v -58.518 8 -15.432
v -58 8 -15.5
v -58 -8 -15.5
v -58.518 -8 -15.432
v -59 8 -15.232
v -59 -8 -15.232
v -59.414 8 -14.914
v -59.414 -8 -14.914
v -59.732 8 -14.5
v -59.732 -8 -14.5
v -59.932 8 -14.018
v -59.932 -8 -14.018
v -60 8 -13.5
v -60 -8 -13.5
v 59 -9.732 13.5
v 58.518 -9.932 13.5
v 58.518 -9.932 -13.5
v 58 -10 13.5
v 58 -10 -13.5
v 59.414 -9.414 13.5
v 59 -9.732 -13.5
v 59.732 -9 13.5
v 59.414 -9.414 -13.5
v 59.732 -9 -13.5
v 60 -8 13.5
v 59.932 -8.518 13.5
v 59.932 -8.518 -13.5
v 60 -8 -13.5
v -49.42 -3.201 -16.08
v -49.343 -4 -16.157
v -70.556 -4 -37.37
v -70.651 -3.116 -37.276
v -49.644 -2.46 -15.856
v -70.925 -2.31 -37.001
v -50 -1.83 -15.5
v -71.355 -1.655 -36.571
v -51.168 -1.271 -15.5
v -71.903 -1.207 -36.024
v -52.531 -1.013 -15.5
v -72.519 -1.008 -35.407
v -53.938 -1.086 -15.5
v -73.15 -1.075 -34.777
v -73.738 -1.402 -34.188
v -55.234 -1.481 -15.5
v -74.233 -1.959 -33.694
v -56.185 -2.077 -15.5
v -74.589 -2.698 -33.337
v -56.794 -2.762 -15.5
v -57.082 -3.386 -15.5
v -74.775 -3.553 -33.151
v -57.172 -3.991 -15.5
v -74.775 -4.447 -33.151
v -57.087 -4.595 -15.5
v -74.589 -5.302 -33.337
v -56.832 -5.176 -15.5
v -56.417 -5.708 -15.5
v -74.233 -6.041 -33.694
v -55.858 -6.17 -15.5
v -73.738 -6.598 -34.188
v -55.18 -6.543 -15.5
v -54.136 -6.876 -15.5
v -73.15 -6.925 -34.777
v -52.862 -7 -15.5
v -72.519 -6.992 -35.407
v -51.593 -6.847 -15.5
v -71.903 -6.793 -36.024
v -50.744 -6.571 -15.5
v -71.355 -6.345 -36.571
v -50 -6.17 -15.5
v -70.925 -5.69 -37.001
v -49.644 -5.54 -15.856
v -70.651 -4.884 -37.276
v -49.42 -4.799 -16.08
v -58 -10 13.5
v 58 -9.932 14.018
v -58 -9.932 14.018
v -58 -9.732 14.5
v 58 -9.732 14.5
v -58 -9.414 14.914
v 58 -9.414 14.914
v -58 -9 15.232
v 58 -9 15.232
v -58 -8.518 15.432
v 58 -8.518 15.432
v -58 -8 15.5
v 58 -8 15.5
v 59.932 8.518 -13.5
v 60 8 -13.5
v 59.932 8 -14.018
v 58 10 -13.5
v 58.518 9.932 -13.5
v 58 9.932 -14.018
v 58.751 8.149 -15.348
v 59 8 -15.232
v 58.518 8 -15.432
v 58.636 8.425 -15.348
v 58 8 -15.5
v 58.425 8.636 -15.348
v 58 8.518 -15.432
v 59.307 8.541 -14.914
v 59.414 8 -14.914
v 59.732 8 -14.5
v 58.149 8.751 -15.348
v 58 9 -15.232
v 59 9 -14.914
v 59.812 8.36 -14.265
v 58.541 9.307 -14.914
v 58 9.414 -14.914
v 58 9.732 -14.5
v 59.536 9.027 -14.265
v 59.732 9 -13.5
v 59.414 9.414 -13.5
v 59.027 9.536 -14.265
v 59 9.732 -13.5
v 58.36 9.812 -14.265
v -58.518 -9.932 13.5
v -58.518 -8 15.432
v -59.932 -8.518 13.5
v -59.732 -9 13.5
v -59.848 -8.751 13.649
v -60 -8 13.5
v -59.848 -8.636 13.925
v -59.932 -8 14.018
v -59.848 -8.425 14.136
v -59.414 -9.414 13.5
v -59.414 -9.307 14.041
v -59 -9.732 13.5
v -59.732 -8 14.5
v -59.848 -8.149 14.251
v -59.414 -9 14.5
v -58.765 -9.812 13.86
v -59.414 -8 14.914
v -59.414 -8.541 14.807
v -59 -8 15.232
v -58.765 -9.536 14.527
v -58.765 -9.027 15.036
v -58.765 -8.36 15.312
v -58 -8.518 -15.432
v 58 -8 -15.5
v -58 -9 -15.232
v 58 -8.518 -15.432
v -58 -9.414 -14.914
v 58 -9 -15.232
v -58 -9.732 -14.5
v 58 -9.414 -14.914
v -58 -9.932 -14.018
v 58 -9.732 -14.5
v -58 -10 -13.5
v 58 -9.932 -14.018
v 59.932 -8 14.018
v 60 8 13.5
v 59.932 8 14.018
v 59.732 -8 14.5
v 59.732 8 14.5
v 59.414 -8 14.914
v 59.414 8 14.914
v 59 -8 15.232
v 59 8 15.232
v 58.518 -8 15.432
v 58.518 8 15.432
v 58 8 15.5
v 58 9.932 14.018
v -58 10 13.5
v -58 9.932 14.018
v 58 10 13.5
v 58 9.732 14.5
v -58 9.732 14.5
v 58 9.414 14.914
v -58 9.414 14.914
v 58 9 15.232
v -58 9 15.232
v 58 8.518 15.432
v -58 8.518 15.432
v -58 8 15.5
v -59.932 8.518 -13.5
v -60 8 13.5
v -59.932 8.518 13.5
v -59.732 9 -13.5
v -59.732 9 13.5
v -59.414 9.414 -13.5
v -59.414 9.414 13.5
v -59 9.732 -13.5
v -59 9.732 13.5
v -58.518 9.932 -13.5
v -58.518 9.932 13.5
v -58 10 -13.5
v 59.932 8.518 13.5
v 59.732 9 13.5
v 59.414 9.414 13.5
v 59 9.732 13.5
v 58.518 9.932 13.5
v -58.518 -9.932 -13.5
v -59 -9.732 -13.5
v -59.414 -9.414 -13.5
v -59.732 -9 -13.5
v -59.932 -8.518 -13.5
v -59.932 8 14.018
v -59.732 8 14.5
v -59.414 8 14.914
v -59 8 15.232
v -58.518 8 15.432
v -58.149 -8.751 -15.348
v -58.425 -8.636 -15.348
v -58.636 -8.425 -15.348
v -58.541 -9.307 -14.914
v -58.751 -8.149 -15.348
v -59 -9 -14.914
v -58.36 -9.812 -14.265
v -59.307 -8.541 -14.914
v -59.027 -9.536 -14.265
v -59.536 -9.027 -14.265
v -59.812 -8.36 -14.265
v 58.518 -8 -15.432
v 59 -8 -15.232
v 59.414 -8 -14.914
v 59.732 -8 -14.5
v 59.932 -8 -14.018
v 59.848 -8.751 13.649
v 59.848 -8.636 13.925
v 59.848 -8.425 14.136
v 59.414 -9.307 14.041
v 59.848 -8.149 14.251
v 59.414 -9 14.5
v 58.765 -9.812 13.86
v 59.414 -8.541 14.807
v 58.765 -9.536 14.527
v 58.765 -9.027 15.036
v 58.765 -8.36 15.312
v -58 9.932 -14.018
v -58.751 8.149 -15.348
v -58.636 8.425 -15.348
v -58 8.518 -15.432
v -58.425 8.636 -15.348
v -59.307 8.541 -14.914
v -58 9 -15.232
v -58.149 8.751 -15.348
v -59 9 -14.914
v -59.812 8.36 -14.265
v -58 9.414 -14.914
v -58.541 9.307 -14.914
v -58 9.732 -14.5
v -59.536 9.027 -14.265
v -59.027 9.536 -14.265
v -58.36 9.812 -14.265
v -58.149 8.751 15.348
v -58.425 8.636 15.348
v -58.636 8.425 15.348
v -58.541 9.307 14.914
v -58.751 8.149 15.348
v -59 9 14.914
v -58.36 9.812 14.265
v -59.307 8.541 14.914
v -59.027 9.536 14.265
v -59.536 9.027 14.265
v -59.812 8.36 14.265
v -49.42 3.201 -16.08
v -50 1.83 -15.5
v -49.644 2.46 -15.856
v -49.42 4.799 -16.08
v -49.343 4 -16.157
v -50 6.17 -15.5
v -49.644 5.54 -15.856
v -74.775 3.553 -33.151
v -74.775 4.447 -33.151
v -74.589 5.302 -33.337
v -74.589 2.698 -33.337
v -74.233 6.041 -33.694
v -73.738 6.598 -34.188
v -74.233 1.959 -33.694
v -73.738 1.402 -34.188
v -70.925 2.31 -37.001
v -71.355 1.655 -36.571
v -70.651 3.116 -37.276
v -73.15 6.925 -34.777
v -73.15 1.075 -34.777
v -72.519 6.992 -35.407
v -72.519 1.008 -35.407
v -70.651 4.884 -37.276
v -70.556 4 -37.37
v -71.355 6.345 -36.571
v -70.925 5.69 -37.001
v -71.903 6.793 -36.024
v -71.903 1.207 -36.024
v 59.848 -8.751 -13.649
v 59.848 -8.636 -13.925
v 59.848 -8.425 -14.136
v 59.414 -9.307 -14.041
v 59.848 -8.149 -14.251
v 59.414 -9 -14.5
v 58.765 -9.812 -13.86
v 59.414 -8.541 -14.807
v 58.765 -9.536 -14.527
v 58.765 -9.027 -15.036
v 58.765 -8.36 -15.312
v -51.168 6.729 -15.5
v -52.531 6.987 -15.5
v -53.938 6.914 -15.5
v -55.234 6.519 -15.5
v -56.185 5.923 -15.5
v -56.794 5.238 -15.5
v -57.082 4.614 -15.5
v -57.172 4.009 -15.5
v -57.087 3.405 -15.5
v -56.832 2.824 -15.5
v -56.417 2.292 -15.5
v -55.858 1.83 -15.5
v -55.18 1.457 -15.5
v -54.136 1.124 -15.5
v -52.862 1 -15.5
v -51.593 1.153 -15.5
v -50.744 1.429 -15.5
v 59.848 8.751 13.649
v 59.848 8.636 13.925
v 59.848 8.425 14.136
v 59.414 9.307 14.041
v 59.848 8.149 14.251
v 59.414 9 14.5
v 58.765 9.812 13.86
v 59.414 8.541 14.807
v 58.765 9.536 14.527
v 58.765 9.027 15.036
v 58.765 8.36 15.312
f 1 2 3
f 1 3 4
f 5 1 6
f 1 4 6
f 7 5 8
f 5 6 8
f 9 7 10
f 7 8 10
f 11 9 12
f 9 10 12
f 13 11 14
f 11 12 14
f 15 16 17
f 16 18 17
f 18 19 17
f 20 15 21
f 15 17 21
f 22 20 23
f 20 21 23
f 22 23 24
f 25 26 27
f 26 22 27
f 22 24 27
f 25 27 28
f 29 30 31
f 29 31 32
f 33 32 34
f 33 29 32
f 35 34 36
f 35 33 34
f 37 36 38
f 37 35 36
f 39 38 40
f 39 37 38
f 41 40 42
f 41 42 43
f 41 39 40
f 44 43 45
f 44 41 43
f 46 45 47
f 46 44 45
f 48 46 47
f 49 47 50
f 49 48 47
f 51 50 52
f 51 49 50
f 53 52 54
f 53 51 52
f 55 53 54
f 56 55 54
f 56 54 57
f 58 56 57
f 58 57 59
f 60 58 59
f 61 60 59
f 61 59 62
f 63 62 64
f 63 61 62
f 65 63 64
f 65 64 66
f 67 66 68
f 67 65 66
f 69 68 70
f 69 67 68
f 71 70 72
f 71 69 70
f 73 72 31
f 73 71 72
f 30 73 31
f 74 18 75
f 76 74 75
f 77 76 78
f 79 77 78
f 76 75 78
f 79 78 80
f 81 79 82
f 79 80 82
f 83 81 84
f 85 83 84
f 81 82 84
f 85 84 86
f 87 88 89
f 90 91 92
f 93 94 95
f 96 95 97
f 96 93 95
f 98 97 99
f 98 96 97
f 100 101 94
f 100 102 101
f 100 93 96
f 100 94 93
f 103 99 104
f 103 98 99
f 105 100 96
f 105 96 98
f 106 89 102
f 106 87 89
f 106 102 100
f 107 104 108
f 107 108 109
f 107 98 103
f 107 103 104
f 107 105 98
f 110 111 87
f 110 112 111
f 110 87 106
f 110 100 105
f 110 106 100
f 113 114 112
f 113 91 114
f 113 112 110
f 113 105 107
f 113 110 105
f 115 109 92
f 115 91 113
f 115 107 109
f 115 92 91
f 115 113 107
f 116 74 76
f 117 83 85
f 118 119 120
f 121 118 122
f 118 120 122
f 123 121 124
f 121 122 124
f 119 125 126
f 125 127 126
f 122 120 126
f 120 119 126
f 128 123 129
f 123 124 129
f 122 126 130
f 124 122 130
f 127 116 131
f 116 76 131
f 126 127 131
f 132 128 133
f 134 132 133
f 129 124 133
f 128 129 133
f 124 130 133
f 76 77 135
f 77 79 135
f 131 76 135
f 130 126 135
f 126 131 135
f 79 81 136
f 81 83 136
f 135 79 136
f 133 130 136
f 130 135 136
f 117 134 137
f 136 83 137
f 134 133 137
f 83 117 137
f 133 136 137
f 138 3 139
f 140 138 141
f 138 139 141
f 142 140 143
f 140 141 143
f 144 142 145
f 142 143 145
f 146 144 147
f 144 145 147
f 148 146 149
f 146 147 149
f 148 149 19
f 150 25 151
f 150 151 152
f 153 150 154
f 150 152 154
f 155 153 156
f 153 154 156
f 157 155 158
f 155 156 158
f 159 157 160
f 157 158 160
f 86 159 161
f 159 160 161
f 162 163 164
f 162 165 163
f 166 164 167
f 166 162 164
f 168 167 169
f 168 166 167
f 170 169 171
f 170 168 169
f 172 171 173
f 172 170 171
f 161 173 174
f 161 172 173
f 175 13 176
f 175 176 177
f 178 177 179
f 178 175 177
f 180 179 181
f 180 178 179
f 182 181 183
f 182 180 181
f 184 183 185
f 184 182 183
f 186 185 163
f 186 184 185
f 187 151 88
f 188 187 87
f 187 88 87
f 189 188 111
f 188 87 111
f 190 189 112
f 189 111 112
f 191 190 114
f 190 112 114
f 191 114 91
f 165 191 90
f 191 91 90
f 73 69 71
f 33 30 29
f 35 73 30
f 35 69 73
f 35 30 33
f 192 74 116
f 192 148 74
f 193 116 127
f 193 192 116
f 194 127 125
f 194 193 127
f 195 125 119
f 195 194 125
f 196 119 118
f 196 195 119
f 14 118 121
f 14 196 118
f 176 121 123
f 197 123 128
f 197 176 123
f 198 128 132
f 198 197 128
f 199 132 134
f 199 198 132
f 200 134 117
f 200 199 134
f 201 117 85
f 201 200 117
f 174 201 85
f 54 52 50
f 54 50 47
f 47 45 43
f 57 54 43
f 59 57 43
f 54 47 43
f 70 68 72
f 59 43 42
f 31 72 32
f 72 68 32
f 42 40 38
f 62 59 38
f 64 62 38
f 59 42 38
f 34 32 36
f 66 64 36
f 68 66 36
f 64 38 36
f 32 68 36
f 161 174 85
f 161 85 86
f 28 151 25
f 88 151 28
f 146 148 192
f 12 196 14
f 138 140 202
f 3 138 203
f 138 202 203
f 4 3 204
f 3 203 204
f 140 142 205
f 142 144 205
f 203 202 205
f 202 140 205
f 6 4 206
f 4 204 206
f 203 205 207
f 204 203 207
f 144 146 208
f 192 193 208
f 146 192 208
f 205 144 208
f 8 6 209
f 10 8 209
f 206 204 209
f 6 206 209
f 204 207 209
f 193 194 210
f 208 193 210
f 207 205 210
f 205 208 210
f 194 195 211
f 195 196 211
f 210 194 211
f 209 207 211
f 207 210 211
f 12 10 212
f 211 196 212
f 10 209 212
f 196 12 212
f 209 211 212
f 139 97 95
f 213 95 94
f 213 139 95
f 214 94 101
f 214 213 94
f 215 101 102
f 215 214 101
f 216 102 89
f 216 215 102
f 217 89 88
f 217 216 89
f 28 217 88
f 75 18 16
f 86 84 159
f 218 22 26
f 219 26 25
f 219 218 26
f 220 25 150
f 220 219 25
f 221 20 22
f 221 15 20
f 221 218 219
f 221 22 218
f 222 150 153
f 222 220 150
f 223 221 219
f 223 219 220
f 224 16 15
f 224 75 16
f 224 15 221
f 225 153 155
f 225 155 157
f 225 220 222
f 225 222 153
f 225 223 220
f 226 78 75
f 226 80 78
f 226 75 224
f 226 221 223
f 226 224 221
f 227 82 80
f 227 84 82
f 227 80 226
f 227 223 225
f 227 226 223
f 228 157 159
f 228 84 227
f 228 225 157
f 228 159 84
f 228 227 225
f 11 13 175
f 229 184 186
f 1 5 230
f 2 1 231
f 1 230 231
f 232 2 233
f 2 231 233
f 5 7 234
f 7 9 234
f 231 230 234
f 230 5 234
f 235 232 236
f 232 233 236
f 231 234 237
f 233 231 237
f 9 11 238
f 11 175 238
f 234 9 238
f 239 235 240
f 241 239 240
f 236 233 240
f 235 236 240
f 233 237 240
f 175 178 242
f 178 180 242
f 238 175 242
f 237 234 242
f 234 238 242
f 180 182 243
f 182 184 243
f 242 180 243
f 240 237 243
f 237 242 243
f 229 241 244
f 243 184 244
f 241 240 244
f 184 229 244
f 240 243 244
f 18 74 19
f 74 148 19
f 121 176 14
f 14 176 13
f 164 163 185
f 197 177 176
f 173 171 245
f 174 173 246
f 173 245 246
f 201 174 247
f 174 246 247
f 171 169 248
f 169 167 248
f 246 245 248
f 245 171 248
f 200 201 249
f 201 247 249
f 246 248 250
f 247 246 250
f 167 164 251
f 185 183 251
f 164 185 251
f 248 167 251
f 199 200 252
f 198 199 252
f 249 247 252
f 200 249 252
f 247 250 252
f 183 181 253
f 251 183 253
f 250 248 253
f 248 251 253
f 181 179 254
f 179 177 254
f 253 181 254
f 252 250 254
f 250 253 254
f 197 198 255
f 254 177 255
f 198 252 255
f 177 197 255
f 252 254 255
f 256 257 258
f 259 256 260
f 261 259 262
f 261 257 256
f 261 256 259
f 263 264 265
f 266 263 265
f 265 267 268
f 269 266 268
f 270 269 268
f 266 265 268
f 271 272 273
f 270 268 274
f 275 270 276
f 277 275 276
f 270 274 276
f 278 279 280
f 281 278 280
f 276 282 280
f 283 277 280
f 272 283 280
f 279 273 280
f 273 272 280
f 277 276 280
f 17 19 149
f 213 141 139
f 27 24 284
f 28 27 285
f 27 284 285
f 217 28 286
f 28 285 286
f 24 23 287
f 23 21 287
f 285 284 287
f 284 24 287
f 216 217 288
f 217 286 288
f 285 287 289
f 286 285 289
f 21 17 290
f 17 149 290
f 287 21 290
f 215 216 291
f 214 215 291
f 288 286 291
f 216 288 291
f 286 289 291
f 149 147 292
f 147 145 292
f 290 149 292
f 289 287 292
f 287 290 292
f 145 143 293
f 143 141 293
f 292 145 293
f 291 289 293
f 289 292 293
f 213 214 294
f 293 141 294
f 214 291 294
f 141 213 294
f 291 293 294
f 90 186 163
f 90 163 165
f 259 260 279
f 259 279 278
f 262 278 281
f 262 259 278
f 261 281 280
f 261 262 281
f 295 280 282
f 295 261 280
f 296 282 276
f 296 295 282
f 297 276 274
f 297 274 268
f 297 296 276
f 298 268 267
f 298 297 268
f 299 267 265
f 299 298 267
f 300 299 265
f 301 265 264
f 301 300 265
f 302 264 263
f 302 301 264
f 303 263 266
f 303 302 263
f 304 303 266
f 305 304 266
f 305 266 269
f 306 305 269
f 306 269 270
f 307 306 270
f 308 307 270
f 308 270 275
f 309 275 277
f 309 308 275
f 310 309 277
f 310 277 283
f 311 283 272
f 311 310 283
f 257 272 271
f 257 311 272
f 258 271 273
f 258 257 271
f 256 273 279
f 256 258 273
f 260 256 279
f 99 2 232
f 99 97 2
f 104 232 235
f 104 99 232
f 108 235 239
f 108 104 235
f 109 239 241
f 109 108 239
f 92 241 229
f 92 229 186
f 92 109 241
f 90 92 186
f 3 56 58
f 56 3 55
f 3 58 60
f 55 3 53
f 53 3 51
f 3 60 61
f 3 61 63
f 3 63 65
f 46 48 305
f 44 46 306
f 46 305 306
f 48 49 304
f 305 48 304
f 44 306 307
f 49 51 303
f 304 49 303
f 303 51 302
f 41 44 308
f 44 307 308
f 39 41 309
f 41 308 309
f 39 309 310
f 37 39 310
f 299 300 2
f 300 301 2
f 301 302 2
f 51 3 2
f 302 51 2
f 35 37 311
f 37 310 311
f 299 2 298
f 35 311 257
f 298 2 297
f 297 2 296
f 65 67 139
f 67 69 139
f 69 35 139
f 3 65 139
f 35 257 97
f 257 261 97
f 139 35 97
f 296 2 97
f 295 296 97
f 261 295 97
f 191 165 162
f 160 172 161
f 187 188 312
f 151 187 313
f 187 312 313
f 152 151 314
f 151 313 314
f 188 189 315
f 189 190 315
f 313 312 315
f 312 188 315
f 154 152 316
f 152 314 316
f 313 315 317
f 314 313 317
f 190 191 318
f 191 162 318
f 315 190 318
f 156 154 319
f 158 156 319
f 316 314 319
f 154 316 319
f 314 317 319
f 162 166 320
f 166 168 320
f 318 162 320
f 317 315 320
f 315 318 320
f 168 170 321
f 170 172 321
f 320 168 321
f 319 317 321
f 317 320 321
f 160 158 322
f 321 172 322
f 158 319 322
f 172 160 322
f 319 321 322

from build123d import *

# Parameters (mm, degrees)
SKETCH1_W           = 120
SKETCH1_H           = 31
BOSS_EXTRUDE1_DEPTH = 10
SKETCH4_R           = 3
BOSS_EXTRUDE2_DEPTH = 30
FILLET1_R           = 2


with BuildPart() as part:
    # Sketch1 → Boss-Extrude1 (new body, symmetric)
    with BuildSketch(Plane(origin=(0, 0, 0), x_dir=(1, 0, 0), z_dir=(0, 1, 0))):
        Rectangle(SKETCH1_W, SKETCH1_H)
    extrude(amount=BOSS_EXTRUDE1_DEPTH, both=True)

    # Sketch4 → Boss-Extrude2 (add)
    with BuildSketch(Plane(origin=(-32.75, 0, -32.75), x_dir=(0.707106781, 0, -0.707106781), z_dir=(0.707106781, 0, 0.707106781))):
        with Locations((-26.466251763, 4)):
            Circle(SKETCH4_R)
        with Locations((-26.466251763, -4)):
            Circle(SKETCH4_R)
    extrude(amount=-BOSS_EXTRUDE2_DEPTH)

    # Fillet1
    fillet1_edges = [part.edges().sort_by_distance(p)[0] for p in [
        (-60, 10, 0),
        (0, 10, 15.5),
        (60, 10, 0),
        (0, -10, 15.5),
        (-60, -10, 0),
        (0, -10, -15.5),
        (60, -10, 0),
        (60, 0, 15.5),
        (-60, 0, 15.5),
        (-60, 0, -15.5),
        (60, 0, -15.5),
        (0, 10, -15.5),
    ]]
    fillet(fillet1_edges, radius=FILLET1_R)


solid = part.part
